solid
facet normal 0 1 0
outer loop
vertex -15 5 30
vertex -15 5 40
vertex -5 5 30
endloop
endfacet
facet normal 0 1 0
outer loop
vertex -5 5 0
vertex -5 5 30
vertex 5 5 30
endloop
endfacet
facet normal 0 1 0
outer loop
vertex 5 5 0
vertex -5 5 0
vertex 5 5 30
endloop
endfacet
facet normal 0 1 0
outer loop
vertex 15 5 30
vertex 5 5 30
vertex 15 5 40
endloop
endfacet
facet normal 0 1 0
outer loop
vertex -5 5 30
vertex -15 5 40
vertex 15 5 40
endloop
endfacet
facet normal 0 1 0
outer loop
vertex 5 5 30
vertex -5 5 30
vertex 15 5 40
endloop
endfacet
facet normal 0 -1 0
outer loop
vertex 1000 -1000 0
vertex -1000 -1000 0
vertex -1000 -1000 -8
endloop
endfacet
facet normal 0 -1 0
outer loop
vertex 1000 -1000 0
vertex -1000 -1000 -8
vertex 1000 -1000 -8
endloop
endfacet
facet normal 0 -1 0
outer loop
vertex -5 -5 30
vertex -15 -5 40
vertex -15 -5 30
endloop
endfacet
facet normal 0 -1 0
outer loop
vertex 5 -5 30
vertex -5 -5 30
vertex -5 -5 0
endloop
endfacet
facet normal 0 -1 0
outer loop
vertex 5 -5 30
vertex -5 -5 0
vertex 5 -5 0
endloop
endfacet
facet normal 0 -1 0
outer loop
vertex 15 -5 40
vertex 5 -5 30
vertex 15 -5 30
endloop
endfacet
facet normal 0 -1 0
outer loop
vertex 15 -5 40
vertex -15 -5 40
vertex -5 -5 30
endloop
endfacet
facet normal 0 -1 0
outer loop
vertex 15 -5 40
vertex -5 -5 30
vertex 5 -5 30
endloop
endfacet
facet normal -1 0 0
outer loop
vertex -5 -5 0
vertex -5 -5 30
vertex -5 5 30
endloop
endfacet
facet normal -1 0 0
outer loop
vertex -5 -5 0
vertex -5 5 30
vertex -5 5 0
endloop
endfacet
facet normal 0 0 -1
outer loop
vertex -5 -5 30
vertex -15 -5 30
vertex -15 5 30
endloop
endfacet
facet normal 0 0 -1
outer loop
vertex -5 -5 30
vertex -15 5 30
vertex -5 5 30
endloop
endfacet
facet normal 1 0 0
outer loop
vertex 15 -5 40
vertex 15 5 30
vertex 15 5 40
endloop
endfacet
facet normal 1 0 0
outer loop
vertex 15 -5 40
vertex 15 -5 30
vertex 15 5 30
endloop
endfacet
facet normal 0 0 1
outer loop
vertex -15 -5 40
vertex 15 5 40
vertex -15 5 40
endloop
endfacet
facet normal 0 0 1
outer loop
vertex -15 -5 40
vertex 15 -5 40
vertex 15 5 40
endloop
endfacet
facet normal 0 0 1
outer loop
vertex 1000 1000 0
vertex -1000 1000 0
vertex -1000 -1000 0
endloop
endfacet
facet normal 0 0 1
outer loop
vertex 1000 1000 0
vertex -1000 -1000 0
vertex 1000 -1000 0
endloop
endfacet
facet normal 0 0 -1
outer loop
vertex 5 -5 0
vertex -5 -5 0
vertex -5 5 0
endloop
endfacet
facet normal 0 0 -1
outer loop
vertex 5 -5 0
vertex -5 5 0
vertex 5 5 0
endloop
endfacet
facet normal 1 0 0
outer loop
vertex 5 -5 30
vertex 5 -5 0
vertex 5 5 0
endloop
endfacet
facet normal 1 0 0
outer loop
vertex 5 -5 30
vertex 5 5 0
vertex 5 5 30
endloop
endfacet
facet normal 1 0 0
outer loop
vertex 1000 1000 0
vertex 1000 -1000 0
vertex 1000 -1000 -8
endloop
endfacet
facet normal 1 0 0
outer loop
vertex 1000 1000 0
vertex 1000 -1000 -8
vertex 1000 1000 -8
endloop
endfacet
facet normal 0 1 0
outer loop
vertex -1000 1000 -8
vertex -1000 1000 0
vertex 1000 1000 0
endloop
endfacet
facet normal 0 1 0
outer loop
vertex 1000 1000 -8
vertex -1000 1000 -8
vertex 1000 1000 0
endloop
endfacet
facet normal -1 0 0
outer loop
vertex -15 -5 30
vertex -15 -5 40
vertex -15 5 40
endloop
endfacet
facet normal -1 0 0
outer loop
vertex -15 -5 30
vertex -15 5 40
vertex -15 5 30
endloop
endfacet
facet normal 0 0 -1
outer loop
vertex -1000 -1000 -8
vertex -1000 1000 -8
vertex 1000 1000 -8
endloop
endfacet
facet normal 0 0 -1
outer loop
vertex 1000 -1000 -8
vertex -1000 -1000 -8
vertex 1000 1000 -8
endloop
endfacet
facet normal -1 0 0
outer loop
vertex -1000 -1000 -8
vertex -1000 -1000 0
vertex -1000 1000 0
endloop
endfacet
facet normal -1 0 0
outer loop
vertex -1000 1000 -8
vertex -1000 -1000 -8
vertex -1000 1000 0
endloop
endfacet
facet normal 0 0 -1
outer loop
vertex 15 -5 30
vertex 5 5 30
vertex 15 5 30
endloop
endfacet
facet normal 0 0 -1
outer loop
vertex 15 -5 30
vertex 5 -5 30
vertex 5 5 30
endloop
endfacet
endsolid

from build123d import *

# Parameters (mm, degrees)
F1_DEPTH = 5
F2_W     = 2000
F2_H     = 2000
F3_DEPTH = 8


with BuildPart() as f1:
    # F0 (on Front) → F1 (new body, symmetric)
    with BuildSketch(Plane.XZ):
        Polygon((15, 40), (-15, 40), (-15, 30), (-5, 30), (-5, 0), (5, 0), (5, 30), (15, 30), align=None)
    extrude(amount=F1_DEPTH, both=True)


with BuildPart() as f3:
    # F2 (on Top) → F3 (new body)
    with BuildSketch(Plane.XY):
        Rectangle(F2_W, F2_H)
    extrude(amount=-F3_DEPTH)


solid = Compound([f1.part, f3.part])
